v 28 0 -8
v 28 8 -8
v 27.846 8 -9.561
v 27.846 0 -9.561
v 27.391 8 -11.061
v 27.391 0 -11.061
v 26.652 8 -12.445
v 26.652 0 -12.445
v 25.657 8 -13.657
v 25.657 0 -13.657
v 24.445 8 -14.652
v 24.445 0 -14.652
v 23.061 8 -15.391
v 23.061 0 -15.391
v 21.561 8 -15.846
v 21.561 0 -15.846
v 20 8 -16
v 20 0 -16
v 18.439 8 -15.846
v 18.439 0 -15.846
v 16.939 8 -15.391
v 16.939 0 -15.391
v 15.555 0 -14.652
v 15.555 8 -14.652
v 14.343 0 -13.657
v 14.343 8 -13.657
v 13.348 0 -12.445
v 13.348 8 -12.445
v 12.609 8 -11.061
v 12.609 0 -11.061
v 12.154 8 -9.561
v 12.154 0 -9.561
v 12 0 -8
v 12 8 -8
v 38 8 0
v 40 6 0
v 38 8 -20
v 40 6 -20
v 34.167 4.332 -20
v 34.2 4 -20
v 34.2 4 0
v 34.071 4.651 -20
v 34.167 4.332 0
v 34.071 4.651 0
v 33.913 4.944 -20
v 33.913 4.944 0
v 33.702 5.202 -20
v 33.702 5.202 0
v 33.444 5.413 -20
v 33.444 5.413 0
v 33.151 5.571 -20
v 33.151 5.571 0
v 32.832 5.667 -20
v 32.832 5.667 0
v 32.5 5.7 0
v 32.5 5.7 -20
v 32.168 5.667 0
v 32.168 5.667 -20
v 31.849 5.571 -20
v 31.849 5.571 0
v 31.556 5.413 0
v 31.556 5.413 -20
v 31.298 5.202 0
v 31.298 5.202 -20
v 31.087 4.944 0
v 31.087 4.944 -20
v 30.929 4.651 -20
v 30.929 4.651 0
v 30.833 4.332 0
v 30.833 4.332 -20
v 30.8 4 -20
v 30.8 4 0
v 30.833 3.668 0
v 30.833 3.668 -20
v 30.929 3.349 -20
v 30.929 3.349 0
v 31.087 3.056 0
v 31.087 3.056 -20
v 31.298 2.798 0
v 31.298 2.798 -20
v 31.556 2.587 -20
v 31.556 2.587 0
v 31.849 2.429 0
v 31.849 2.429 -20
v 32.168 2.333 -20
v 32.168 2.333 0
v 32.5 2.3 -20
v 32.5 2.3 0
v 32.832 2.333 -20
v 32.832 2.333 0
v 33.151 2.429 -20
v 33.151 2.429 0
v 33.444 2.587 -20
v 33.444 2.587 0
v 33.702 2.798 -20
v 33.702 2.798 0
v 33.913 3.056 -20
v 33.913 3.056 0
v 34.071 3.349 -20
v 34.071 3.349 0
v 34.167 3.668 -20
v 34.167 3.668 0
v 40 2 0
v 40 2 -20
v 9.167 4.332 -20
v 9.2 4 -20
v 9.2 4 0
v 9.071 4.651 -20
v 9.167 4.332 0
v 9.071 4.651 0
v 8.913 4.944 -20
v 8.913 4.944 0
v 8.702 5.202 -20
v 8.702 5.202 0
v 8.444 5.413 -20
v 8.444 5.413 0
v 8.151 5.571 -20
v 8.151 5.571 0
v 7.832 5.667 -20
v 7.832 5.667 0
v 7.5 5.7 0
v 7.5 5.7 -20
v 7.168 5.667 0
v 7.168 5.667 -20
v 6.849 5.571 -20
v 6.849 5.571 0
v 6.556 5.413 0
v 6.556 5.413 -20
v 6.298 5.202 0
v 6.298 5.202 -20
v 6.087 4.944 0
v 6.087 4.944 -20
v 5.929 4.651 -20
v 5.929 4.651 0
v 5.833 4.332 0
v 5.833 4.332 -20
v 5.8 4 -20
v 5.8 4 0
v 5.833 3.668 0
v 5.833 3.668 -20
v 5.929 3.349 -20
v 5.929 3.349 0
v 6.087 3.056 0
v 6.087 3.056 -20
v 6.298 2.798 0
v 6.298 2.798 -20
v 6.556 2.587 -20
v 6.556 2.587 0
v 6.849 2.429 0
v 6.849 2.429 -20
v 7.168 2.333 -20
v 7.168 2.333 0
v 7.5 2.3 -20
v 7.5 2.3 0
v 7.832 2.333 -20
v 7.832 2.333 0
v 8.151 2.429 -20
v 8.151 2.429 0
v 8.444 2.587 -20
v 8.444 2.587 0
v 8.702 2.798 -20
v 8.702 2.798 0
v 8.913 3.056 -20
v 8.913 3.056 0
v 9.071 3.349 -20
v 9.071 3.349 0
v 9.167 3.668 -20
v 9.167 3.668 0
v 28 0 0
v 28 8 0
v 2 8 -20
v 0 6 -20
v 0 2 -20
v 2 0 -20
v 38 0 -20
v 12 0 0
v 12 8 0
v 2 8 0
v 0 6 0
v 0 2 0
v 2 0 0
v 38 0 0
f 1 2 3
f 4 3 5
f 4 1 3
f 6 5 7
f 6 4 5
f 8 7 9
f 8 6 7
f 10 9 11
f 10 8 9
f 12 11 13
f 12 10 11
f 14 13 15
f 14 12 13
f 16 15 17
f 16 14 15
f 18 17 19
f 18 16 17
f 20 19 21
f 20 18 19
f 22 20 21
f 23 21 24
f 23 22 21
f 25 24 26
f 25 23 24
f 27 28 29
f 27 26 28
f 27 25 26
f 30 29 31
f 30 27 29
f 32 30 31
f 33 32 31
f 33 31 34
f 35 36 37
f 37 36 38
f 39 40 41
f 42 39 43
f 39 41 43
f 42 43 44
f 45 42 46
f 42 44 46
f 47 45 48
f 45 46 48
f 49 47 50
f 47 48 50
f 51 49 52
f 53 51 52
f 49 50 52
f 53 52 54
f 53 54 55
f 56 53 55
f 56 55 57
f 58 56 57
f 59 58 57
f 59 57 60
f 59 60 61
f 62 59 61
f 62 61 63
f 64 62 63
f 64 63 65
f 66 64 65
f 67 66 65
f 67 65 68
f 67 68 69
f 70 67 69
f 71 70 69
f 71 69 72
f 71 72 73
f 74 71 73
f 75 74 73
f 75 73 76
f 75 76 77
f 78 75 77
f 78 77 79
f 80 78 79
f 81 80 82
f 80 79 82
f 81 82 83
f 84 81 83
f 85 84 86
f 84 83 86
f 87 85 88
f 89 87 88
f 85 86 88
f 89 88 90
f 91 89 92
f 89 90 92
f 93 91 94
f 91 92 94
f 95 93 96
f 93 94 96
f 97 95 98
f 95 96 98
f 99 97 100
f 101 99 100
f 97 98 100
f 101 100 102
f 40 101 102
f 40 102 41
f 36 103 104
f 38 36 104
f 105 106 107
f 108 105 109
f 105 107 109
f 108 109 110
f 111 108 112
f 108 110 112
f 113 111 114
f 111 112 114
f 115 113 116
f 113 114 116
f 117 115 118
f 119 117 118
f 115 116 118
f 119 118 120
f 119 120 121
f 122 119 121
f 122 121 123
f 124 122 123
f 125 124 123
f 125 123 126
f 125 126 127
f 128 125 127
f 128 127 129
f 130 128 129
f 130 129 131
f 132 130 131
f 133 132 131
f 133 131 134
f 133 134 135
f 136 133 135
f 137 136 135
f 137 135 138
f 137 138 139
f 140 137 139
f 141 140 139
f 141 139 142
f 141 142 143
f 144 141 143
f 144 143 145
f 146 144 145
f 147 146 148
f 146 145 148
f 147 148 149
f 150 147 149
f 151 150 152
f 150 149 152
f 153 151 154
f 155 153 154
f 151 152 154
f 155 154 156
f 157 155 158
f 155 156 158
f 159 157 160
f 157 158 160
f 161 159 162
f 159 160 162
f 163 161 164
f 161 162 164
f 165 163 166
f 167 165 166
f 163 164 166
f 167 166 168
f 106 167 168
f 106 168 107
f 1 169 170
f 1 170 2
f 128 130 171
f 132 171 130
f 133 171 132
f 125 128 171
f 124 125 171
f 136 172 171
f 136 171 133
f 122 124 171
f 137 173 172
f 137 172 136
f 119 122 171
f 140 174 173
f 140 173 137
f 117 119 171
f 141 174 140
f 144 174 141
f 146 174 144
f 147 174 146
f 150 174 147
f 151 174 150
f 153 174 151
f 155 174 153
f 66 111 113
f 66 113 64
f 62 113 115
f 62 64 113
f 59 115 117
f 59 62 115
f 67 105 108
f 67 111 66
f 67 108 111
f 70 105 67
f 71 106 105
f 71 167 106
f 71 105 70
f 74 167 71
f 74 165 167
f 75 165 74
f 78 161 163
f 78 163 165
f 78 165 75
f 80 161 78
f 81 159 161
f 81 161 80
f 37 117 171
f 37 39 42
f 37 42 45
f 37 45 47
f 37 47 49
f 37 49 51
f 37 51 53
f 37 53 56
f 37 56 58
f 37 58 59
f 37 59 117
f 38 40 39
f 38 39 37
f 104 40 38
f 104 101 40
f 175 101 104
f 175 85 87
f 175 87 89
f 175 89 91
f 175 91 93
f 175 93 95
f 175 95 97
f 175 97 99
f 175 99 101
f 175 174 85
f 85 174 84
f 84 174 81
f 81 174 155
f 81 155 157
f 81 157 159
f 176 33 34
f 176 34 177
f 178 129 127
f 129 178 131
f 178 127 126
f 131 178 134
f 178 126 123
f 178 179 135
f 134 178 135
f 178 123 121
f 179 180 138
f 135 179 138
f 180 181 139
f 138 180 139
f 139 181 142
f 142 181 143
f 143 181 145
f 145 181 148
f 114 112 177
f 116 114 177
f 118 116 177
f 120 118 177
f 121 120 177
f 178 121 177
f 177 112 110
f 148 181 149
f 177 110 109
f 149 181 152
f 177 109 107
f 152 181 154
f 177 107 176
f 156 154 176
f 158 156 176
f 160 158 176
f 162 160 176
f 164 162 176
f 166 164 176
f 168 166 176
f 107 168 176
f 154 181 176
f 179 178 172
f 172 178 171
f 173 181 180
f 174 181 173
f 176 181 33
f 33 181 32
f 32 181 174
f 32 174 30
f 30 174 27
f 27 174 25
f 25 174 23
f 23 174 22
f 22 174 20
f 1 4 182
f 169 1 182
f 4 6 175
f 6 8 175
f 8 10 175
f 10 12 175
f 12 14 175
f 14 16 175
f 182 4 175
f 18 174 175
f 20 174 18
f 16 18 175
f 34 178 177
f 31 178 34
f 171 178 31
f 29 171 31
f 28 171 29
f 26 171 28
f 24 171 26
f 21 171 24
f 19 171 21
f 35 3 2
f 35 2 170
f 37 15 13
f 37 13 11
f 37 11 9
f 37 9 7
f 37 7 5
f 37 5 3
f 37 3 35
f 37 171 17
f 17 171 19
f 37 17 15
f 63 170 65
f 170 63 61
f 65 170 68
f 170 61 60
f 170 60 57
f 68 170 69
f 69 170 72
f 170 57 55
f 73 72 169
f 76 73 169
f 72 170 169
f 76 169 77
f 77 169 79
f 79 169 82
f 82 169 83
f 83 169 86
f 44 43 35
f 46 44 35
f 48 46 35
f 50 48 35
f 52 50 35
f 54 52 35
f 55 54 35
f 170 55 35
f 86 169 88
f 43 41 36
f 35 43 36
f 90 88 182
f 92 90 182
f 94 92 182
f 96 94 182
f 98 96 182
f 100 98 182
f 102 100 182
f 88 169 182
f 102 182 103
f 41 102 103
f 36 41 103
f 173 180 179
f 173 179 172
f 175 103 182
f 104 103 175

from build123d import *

# Parameters (mm, degrees)
SKETCH2_W           = 40
SKETCH2_H           = 20
BOSS_EXTRUDE1_DEPTH = 8
CUT_EXTRUDE1_DEPTH  = 9
SKETCH4_R           = 1.7
CUT_EXTRUDE2_DEPTH  = 21
CHAMFER1_SIZE       = 2


with BuildPart() as part:
    # Sketch2 → Boss-Extrude1 (new body)
    with BuildSketch(Plane(origin=(0, 0, 0), x_dir=(1, 0, 0), z_dir=(0, 1, 0))):
        with Locations((20, 10)):
            Rectangle(SKETCH2_W, SKETCH2_H)
    extrude(amount=BOSS_EXTRUDE1_DEPTH)

    # Sketch3 → Cut-Extrude1 (cut, through all)
    with BuildSketch(Plane.XZ):
        with BuildLine():
            Line((12, -8), (12, 0))
            Line((12, 0), (28, 0))
            Line((28, 0), (28, -8))
            ThreePointArc((28, -8), (20, -16), (12, -8))
        make_face()
    extrude(amount=-CUT_EXTRUDE1_DEPTH, mode=Mode.SUBTRACT)

    # Sketch4 → Cut-Extrude2 (cut, through all)
    with BuildSketch(Plane.XY):
        with Locations((7.5, 4)):
            Circle(SKETCH4_R)
        with Locations((32.5, 4)):
            Circle(SKETCH4_R)
    extrude(amount=-CUT_EXTRUDE2_DEPTH, mode=Mode.SUBTRACT)

    # Chamfer1
    chamfer1_edges = [part.edges().sort_by_distance(p)[0] for p in [
        (40, 8, -10),
        (0, 8, -10),
        (40, 0, -10),
        (0, 0, -10),
    ]]
    chamfer(chamfer1_edges, length=CHAMFER1_SIZE)


solid = part.part
